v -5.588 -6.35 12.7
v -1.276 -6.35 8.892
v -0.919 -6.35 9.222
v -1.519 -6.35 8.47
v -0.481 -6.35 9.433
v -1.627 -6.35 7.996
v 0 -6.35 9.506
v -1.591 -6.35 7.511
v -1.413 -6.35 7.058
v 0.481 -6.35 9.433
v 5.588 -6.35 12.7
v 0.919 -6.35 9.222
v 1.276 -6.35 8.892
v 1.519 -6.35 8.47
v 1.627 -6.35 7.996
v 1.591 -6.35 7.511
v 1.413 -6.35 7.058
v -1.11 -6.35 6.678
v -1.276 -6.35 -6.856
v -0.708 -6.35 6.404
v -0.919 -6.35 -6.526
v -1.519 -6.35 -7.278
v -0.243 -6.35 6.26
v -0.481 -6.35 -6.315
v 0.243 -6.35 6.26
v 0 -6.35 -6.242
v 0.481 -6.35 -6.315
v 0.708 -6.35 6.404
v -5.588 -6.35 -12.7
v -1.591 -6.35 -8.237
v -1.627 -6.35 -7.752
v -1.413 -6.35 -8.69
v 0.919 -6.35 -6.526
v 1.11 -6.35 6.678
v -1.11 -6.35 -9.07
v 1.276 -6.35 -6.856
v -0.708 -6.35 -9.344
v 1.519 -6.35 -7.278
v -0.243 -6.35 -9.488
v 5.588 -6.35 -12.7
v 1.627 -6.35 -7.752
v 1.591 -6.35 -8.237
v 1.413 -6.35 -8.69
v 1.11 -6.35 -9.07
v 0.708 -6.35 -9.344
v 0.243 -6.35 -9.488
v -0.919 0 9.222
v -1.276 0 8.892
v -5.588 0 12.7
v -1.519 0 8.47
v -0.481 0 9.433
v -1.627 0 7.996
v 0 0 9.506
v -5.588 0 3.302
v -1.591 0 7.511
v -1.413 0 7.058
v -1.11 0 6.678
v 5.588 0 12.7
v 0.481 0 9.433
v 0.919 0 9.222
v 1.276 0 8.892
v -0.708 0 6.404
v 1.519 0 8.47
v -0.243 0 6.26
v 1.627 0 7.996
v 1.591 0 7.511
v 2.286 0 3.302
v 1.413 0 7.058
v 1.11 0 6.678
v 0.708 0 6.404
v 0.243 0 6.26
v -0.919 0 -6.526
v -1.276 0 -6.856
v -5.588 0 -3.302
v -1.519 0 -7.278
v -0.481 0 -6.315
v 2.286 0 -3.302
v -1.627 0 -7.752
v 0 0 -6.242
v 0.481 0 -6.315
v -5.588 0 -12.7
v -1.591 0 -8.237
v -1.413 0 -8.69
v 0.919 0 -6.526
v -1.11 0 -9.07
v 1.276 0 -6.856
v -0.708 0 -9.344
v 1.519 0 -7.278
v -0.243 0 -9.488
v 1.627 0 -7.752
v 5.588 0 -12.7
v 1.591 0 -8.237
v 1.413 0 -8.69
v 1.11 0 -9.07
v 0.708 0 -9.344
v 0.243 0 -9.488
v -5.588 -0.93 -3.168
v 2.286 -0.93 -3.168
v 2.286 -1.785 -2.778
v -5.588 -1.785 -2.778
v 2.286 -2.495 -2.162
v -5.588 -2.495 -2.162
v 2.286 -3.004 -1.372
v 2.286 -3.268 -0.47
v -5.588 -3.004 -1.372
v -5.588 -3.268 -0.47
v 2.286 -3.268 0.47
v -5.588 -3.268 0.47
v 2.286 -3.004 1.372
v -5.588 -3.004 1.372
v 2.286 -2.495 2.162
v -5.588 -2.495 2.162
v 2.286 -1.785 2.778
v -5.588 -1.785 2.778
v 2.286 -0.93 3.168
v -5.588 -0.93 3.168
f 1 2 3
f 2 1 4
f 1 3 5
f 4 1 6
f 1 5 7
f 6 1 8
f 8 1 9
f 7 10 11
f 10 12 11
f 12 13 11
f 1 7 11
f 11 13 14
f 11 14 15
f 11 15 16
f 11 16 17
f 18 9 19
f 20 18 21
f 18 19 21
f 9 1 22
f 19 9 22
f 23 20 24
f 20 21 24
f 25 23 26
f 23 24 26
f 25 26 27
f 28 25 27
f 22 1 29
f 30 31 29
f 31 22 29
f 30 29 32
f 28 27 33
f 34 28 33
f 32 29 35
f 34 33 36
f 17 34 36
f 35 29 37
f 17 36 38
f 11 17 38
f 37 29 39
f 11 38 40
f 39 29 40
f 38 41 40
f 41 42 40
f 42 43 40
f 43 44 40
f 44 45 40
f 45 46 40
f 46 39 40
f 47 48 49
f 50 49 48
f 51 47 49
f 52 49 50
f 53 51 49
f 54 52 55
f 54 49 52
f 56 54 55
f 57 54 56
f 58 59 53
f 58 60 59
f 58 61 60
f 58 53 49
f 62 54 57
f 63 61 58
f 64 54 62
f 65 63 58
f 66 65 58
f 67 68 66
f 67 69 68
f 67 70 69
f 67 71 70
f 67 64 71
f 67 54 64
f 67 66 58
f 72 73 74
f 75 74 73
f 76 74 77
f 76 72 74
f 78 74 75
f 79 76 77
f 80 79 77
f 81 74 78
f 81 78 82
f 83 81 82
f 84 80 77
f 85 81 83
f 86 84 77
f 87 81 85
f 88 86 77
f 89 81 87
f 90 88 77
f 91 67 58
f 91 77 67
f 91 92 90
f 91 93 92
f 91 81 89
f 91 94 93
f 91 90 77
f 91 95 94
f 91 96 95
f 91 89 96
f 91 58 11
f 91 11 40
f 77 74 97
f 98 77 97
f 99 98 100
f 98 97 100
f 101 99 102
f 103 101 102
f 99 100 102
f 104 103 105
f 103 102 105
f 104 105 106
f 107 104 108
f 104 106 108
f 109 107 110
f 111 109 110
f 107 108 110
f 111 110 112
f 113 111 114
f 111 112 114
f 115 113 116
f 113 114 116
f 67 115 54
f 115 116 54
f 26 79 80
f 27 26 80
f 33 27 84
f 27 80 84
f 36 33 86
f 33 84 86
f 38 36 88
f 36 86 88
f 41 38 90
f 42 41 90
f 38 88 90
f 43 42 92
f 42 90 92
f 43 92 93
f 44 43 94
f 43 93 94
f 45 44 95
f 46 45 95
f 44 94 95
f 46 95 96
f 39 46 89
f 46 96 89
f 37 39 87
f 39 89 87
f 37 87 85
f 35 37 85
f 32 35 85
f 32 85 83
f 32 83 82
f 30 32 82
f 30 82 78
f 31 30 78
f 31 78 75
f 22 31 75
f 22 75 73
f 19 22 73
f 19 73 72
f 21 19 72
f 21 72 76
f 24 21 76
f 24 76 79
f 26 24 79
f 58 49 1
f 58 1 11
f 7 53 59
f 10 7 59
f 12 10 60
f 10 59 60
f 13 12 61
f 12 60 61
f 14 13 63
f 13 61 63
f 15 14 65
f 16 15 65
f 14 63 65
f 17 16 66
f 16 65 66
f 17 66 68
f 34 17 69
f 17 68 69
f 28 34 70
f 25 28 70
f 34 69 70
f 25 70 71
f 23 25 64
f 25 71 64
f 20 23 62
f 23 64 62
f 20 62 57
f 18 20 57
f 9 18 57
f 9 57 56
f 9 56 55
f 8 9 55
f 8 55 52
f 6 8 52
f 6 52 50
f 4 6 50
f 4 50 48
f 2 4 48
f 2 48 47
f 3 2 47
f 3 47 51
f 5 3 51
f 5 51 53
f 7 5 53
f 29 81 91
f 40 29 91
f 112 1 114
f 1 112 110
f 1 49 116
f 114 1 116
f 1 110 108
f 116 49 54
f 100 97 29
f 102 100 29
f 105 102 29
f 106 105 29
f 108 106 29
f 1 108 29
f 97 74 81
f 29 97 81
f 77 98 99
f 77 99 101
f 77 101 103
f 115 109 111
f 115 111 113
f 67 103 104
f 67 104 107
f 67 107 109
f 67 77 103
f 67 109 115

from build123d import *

# Parameters (mm, degrees)
SKETCH1_W           = 11.176
SKETCH1_H           = 25.4
BOSS_EXTRUDE1_DEPTH = 6.35
SKETCH2_R           = 3.302
CUT_EXTRUDE1_DEPTH  = 7.874
CUT_EXTRUDE2_REACH  = 17.259
SKETCH3_R           = 1.63195


with BuildPart() as part:
    # Sketch1 → Boss-Extrude1 (new body)
    with BuildSketch(Plane(origin=(0, 0, 0), x_dir=(1, 0, 0), z_dir=(0, 1, 0))):
        Rectangle(SKETCH1_W, SKETCH1_H)
    extrude(amount=-BOSS_EXTRUDE1_DEPTH)

    # Sketch2 → Cut-Extrude1 (cut)
    with BuildSketch(Plane.ZY.offset(5.588)):
        Circle(SKETCH2_R)
    extrude(amount=-CUT_EXTRUDE1_DEPTH, mode=Mode.SUBTRACT)

    # Sketch3 → Cut-Extrude2 (cut, up to next)
    with BuildSketch(Plane(origin=(0, 0, 0), x_dir=(1, 0, 0), z_dir=(0, 1, 0)), mode=Mode.PRIVATE) as cut_extrude2_sk1:
        with Locations(Location((0, 7.874, 0), (0, 0, 270))):
            Circle(SKETCH3_R)
    cut_extrude2_tool1 = extrude(cut_extrude2_sk1.sketch, amount=-CUT_EXTRUDE2_REACH, mode=Mode.PRIVATE) & part.part
    # Sketch3 → Cut-Extrude2 (cut, up to next)
    with BuildSketch(Plane(origin=(0, 0, 0), x_dir=(1, 0, 0), z_dir=(0, 1, 0)), mode=Mode.PRIVATE) as cut_extrude2_sk2:
        with Locations(Location((0, -7.874, 0), (0, 0, 270))):
            Circle(SKETCH3_R)
    cut_extrude2_tool2 = extrude(cut_extrude2_sk2.sketch, amount=-CUT_EXTRUDE2_REACH, mode=Mode.PRIVATE) & part.part
    add(cut_extrude2_tool1.solids().sort_by_distance((0, 0, -7.874))[0], mode=Mode.SUBTRACT)
    add(cut_extrude2_tool2.solids().sort_by_distance((0, 0, 7.874))[0], mode=Mode.SUBTRACT)


solid = part.part
